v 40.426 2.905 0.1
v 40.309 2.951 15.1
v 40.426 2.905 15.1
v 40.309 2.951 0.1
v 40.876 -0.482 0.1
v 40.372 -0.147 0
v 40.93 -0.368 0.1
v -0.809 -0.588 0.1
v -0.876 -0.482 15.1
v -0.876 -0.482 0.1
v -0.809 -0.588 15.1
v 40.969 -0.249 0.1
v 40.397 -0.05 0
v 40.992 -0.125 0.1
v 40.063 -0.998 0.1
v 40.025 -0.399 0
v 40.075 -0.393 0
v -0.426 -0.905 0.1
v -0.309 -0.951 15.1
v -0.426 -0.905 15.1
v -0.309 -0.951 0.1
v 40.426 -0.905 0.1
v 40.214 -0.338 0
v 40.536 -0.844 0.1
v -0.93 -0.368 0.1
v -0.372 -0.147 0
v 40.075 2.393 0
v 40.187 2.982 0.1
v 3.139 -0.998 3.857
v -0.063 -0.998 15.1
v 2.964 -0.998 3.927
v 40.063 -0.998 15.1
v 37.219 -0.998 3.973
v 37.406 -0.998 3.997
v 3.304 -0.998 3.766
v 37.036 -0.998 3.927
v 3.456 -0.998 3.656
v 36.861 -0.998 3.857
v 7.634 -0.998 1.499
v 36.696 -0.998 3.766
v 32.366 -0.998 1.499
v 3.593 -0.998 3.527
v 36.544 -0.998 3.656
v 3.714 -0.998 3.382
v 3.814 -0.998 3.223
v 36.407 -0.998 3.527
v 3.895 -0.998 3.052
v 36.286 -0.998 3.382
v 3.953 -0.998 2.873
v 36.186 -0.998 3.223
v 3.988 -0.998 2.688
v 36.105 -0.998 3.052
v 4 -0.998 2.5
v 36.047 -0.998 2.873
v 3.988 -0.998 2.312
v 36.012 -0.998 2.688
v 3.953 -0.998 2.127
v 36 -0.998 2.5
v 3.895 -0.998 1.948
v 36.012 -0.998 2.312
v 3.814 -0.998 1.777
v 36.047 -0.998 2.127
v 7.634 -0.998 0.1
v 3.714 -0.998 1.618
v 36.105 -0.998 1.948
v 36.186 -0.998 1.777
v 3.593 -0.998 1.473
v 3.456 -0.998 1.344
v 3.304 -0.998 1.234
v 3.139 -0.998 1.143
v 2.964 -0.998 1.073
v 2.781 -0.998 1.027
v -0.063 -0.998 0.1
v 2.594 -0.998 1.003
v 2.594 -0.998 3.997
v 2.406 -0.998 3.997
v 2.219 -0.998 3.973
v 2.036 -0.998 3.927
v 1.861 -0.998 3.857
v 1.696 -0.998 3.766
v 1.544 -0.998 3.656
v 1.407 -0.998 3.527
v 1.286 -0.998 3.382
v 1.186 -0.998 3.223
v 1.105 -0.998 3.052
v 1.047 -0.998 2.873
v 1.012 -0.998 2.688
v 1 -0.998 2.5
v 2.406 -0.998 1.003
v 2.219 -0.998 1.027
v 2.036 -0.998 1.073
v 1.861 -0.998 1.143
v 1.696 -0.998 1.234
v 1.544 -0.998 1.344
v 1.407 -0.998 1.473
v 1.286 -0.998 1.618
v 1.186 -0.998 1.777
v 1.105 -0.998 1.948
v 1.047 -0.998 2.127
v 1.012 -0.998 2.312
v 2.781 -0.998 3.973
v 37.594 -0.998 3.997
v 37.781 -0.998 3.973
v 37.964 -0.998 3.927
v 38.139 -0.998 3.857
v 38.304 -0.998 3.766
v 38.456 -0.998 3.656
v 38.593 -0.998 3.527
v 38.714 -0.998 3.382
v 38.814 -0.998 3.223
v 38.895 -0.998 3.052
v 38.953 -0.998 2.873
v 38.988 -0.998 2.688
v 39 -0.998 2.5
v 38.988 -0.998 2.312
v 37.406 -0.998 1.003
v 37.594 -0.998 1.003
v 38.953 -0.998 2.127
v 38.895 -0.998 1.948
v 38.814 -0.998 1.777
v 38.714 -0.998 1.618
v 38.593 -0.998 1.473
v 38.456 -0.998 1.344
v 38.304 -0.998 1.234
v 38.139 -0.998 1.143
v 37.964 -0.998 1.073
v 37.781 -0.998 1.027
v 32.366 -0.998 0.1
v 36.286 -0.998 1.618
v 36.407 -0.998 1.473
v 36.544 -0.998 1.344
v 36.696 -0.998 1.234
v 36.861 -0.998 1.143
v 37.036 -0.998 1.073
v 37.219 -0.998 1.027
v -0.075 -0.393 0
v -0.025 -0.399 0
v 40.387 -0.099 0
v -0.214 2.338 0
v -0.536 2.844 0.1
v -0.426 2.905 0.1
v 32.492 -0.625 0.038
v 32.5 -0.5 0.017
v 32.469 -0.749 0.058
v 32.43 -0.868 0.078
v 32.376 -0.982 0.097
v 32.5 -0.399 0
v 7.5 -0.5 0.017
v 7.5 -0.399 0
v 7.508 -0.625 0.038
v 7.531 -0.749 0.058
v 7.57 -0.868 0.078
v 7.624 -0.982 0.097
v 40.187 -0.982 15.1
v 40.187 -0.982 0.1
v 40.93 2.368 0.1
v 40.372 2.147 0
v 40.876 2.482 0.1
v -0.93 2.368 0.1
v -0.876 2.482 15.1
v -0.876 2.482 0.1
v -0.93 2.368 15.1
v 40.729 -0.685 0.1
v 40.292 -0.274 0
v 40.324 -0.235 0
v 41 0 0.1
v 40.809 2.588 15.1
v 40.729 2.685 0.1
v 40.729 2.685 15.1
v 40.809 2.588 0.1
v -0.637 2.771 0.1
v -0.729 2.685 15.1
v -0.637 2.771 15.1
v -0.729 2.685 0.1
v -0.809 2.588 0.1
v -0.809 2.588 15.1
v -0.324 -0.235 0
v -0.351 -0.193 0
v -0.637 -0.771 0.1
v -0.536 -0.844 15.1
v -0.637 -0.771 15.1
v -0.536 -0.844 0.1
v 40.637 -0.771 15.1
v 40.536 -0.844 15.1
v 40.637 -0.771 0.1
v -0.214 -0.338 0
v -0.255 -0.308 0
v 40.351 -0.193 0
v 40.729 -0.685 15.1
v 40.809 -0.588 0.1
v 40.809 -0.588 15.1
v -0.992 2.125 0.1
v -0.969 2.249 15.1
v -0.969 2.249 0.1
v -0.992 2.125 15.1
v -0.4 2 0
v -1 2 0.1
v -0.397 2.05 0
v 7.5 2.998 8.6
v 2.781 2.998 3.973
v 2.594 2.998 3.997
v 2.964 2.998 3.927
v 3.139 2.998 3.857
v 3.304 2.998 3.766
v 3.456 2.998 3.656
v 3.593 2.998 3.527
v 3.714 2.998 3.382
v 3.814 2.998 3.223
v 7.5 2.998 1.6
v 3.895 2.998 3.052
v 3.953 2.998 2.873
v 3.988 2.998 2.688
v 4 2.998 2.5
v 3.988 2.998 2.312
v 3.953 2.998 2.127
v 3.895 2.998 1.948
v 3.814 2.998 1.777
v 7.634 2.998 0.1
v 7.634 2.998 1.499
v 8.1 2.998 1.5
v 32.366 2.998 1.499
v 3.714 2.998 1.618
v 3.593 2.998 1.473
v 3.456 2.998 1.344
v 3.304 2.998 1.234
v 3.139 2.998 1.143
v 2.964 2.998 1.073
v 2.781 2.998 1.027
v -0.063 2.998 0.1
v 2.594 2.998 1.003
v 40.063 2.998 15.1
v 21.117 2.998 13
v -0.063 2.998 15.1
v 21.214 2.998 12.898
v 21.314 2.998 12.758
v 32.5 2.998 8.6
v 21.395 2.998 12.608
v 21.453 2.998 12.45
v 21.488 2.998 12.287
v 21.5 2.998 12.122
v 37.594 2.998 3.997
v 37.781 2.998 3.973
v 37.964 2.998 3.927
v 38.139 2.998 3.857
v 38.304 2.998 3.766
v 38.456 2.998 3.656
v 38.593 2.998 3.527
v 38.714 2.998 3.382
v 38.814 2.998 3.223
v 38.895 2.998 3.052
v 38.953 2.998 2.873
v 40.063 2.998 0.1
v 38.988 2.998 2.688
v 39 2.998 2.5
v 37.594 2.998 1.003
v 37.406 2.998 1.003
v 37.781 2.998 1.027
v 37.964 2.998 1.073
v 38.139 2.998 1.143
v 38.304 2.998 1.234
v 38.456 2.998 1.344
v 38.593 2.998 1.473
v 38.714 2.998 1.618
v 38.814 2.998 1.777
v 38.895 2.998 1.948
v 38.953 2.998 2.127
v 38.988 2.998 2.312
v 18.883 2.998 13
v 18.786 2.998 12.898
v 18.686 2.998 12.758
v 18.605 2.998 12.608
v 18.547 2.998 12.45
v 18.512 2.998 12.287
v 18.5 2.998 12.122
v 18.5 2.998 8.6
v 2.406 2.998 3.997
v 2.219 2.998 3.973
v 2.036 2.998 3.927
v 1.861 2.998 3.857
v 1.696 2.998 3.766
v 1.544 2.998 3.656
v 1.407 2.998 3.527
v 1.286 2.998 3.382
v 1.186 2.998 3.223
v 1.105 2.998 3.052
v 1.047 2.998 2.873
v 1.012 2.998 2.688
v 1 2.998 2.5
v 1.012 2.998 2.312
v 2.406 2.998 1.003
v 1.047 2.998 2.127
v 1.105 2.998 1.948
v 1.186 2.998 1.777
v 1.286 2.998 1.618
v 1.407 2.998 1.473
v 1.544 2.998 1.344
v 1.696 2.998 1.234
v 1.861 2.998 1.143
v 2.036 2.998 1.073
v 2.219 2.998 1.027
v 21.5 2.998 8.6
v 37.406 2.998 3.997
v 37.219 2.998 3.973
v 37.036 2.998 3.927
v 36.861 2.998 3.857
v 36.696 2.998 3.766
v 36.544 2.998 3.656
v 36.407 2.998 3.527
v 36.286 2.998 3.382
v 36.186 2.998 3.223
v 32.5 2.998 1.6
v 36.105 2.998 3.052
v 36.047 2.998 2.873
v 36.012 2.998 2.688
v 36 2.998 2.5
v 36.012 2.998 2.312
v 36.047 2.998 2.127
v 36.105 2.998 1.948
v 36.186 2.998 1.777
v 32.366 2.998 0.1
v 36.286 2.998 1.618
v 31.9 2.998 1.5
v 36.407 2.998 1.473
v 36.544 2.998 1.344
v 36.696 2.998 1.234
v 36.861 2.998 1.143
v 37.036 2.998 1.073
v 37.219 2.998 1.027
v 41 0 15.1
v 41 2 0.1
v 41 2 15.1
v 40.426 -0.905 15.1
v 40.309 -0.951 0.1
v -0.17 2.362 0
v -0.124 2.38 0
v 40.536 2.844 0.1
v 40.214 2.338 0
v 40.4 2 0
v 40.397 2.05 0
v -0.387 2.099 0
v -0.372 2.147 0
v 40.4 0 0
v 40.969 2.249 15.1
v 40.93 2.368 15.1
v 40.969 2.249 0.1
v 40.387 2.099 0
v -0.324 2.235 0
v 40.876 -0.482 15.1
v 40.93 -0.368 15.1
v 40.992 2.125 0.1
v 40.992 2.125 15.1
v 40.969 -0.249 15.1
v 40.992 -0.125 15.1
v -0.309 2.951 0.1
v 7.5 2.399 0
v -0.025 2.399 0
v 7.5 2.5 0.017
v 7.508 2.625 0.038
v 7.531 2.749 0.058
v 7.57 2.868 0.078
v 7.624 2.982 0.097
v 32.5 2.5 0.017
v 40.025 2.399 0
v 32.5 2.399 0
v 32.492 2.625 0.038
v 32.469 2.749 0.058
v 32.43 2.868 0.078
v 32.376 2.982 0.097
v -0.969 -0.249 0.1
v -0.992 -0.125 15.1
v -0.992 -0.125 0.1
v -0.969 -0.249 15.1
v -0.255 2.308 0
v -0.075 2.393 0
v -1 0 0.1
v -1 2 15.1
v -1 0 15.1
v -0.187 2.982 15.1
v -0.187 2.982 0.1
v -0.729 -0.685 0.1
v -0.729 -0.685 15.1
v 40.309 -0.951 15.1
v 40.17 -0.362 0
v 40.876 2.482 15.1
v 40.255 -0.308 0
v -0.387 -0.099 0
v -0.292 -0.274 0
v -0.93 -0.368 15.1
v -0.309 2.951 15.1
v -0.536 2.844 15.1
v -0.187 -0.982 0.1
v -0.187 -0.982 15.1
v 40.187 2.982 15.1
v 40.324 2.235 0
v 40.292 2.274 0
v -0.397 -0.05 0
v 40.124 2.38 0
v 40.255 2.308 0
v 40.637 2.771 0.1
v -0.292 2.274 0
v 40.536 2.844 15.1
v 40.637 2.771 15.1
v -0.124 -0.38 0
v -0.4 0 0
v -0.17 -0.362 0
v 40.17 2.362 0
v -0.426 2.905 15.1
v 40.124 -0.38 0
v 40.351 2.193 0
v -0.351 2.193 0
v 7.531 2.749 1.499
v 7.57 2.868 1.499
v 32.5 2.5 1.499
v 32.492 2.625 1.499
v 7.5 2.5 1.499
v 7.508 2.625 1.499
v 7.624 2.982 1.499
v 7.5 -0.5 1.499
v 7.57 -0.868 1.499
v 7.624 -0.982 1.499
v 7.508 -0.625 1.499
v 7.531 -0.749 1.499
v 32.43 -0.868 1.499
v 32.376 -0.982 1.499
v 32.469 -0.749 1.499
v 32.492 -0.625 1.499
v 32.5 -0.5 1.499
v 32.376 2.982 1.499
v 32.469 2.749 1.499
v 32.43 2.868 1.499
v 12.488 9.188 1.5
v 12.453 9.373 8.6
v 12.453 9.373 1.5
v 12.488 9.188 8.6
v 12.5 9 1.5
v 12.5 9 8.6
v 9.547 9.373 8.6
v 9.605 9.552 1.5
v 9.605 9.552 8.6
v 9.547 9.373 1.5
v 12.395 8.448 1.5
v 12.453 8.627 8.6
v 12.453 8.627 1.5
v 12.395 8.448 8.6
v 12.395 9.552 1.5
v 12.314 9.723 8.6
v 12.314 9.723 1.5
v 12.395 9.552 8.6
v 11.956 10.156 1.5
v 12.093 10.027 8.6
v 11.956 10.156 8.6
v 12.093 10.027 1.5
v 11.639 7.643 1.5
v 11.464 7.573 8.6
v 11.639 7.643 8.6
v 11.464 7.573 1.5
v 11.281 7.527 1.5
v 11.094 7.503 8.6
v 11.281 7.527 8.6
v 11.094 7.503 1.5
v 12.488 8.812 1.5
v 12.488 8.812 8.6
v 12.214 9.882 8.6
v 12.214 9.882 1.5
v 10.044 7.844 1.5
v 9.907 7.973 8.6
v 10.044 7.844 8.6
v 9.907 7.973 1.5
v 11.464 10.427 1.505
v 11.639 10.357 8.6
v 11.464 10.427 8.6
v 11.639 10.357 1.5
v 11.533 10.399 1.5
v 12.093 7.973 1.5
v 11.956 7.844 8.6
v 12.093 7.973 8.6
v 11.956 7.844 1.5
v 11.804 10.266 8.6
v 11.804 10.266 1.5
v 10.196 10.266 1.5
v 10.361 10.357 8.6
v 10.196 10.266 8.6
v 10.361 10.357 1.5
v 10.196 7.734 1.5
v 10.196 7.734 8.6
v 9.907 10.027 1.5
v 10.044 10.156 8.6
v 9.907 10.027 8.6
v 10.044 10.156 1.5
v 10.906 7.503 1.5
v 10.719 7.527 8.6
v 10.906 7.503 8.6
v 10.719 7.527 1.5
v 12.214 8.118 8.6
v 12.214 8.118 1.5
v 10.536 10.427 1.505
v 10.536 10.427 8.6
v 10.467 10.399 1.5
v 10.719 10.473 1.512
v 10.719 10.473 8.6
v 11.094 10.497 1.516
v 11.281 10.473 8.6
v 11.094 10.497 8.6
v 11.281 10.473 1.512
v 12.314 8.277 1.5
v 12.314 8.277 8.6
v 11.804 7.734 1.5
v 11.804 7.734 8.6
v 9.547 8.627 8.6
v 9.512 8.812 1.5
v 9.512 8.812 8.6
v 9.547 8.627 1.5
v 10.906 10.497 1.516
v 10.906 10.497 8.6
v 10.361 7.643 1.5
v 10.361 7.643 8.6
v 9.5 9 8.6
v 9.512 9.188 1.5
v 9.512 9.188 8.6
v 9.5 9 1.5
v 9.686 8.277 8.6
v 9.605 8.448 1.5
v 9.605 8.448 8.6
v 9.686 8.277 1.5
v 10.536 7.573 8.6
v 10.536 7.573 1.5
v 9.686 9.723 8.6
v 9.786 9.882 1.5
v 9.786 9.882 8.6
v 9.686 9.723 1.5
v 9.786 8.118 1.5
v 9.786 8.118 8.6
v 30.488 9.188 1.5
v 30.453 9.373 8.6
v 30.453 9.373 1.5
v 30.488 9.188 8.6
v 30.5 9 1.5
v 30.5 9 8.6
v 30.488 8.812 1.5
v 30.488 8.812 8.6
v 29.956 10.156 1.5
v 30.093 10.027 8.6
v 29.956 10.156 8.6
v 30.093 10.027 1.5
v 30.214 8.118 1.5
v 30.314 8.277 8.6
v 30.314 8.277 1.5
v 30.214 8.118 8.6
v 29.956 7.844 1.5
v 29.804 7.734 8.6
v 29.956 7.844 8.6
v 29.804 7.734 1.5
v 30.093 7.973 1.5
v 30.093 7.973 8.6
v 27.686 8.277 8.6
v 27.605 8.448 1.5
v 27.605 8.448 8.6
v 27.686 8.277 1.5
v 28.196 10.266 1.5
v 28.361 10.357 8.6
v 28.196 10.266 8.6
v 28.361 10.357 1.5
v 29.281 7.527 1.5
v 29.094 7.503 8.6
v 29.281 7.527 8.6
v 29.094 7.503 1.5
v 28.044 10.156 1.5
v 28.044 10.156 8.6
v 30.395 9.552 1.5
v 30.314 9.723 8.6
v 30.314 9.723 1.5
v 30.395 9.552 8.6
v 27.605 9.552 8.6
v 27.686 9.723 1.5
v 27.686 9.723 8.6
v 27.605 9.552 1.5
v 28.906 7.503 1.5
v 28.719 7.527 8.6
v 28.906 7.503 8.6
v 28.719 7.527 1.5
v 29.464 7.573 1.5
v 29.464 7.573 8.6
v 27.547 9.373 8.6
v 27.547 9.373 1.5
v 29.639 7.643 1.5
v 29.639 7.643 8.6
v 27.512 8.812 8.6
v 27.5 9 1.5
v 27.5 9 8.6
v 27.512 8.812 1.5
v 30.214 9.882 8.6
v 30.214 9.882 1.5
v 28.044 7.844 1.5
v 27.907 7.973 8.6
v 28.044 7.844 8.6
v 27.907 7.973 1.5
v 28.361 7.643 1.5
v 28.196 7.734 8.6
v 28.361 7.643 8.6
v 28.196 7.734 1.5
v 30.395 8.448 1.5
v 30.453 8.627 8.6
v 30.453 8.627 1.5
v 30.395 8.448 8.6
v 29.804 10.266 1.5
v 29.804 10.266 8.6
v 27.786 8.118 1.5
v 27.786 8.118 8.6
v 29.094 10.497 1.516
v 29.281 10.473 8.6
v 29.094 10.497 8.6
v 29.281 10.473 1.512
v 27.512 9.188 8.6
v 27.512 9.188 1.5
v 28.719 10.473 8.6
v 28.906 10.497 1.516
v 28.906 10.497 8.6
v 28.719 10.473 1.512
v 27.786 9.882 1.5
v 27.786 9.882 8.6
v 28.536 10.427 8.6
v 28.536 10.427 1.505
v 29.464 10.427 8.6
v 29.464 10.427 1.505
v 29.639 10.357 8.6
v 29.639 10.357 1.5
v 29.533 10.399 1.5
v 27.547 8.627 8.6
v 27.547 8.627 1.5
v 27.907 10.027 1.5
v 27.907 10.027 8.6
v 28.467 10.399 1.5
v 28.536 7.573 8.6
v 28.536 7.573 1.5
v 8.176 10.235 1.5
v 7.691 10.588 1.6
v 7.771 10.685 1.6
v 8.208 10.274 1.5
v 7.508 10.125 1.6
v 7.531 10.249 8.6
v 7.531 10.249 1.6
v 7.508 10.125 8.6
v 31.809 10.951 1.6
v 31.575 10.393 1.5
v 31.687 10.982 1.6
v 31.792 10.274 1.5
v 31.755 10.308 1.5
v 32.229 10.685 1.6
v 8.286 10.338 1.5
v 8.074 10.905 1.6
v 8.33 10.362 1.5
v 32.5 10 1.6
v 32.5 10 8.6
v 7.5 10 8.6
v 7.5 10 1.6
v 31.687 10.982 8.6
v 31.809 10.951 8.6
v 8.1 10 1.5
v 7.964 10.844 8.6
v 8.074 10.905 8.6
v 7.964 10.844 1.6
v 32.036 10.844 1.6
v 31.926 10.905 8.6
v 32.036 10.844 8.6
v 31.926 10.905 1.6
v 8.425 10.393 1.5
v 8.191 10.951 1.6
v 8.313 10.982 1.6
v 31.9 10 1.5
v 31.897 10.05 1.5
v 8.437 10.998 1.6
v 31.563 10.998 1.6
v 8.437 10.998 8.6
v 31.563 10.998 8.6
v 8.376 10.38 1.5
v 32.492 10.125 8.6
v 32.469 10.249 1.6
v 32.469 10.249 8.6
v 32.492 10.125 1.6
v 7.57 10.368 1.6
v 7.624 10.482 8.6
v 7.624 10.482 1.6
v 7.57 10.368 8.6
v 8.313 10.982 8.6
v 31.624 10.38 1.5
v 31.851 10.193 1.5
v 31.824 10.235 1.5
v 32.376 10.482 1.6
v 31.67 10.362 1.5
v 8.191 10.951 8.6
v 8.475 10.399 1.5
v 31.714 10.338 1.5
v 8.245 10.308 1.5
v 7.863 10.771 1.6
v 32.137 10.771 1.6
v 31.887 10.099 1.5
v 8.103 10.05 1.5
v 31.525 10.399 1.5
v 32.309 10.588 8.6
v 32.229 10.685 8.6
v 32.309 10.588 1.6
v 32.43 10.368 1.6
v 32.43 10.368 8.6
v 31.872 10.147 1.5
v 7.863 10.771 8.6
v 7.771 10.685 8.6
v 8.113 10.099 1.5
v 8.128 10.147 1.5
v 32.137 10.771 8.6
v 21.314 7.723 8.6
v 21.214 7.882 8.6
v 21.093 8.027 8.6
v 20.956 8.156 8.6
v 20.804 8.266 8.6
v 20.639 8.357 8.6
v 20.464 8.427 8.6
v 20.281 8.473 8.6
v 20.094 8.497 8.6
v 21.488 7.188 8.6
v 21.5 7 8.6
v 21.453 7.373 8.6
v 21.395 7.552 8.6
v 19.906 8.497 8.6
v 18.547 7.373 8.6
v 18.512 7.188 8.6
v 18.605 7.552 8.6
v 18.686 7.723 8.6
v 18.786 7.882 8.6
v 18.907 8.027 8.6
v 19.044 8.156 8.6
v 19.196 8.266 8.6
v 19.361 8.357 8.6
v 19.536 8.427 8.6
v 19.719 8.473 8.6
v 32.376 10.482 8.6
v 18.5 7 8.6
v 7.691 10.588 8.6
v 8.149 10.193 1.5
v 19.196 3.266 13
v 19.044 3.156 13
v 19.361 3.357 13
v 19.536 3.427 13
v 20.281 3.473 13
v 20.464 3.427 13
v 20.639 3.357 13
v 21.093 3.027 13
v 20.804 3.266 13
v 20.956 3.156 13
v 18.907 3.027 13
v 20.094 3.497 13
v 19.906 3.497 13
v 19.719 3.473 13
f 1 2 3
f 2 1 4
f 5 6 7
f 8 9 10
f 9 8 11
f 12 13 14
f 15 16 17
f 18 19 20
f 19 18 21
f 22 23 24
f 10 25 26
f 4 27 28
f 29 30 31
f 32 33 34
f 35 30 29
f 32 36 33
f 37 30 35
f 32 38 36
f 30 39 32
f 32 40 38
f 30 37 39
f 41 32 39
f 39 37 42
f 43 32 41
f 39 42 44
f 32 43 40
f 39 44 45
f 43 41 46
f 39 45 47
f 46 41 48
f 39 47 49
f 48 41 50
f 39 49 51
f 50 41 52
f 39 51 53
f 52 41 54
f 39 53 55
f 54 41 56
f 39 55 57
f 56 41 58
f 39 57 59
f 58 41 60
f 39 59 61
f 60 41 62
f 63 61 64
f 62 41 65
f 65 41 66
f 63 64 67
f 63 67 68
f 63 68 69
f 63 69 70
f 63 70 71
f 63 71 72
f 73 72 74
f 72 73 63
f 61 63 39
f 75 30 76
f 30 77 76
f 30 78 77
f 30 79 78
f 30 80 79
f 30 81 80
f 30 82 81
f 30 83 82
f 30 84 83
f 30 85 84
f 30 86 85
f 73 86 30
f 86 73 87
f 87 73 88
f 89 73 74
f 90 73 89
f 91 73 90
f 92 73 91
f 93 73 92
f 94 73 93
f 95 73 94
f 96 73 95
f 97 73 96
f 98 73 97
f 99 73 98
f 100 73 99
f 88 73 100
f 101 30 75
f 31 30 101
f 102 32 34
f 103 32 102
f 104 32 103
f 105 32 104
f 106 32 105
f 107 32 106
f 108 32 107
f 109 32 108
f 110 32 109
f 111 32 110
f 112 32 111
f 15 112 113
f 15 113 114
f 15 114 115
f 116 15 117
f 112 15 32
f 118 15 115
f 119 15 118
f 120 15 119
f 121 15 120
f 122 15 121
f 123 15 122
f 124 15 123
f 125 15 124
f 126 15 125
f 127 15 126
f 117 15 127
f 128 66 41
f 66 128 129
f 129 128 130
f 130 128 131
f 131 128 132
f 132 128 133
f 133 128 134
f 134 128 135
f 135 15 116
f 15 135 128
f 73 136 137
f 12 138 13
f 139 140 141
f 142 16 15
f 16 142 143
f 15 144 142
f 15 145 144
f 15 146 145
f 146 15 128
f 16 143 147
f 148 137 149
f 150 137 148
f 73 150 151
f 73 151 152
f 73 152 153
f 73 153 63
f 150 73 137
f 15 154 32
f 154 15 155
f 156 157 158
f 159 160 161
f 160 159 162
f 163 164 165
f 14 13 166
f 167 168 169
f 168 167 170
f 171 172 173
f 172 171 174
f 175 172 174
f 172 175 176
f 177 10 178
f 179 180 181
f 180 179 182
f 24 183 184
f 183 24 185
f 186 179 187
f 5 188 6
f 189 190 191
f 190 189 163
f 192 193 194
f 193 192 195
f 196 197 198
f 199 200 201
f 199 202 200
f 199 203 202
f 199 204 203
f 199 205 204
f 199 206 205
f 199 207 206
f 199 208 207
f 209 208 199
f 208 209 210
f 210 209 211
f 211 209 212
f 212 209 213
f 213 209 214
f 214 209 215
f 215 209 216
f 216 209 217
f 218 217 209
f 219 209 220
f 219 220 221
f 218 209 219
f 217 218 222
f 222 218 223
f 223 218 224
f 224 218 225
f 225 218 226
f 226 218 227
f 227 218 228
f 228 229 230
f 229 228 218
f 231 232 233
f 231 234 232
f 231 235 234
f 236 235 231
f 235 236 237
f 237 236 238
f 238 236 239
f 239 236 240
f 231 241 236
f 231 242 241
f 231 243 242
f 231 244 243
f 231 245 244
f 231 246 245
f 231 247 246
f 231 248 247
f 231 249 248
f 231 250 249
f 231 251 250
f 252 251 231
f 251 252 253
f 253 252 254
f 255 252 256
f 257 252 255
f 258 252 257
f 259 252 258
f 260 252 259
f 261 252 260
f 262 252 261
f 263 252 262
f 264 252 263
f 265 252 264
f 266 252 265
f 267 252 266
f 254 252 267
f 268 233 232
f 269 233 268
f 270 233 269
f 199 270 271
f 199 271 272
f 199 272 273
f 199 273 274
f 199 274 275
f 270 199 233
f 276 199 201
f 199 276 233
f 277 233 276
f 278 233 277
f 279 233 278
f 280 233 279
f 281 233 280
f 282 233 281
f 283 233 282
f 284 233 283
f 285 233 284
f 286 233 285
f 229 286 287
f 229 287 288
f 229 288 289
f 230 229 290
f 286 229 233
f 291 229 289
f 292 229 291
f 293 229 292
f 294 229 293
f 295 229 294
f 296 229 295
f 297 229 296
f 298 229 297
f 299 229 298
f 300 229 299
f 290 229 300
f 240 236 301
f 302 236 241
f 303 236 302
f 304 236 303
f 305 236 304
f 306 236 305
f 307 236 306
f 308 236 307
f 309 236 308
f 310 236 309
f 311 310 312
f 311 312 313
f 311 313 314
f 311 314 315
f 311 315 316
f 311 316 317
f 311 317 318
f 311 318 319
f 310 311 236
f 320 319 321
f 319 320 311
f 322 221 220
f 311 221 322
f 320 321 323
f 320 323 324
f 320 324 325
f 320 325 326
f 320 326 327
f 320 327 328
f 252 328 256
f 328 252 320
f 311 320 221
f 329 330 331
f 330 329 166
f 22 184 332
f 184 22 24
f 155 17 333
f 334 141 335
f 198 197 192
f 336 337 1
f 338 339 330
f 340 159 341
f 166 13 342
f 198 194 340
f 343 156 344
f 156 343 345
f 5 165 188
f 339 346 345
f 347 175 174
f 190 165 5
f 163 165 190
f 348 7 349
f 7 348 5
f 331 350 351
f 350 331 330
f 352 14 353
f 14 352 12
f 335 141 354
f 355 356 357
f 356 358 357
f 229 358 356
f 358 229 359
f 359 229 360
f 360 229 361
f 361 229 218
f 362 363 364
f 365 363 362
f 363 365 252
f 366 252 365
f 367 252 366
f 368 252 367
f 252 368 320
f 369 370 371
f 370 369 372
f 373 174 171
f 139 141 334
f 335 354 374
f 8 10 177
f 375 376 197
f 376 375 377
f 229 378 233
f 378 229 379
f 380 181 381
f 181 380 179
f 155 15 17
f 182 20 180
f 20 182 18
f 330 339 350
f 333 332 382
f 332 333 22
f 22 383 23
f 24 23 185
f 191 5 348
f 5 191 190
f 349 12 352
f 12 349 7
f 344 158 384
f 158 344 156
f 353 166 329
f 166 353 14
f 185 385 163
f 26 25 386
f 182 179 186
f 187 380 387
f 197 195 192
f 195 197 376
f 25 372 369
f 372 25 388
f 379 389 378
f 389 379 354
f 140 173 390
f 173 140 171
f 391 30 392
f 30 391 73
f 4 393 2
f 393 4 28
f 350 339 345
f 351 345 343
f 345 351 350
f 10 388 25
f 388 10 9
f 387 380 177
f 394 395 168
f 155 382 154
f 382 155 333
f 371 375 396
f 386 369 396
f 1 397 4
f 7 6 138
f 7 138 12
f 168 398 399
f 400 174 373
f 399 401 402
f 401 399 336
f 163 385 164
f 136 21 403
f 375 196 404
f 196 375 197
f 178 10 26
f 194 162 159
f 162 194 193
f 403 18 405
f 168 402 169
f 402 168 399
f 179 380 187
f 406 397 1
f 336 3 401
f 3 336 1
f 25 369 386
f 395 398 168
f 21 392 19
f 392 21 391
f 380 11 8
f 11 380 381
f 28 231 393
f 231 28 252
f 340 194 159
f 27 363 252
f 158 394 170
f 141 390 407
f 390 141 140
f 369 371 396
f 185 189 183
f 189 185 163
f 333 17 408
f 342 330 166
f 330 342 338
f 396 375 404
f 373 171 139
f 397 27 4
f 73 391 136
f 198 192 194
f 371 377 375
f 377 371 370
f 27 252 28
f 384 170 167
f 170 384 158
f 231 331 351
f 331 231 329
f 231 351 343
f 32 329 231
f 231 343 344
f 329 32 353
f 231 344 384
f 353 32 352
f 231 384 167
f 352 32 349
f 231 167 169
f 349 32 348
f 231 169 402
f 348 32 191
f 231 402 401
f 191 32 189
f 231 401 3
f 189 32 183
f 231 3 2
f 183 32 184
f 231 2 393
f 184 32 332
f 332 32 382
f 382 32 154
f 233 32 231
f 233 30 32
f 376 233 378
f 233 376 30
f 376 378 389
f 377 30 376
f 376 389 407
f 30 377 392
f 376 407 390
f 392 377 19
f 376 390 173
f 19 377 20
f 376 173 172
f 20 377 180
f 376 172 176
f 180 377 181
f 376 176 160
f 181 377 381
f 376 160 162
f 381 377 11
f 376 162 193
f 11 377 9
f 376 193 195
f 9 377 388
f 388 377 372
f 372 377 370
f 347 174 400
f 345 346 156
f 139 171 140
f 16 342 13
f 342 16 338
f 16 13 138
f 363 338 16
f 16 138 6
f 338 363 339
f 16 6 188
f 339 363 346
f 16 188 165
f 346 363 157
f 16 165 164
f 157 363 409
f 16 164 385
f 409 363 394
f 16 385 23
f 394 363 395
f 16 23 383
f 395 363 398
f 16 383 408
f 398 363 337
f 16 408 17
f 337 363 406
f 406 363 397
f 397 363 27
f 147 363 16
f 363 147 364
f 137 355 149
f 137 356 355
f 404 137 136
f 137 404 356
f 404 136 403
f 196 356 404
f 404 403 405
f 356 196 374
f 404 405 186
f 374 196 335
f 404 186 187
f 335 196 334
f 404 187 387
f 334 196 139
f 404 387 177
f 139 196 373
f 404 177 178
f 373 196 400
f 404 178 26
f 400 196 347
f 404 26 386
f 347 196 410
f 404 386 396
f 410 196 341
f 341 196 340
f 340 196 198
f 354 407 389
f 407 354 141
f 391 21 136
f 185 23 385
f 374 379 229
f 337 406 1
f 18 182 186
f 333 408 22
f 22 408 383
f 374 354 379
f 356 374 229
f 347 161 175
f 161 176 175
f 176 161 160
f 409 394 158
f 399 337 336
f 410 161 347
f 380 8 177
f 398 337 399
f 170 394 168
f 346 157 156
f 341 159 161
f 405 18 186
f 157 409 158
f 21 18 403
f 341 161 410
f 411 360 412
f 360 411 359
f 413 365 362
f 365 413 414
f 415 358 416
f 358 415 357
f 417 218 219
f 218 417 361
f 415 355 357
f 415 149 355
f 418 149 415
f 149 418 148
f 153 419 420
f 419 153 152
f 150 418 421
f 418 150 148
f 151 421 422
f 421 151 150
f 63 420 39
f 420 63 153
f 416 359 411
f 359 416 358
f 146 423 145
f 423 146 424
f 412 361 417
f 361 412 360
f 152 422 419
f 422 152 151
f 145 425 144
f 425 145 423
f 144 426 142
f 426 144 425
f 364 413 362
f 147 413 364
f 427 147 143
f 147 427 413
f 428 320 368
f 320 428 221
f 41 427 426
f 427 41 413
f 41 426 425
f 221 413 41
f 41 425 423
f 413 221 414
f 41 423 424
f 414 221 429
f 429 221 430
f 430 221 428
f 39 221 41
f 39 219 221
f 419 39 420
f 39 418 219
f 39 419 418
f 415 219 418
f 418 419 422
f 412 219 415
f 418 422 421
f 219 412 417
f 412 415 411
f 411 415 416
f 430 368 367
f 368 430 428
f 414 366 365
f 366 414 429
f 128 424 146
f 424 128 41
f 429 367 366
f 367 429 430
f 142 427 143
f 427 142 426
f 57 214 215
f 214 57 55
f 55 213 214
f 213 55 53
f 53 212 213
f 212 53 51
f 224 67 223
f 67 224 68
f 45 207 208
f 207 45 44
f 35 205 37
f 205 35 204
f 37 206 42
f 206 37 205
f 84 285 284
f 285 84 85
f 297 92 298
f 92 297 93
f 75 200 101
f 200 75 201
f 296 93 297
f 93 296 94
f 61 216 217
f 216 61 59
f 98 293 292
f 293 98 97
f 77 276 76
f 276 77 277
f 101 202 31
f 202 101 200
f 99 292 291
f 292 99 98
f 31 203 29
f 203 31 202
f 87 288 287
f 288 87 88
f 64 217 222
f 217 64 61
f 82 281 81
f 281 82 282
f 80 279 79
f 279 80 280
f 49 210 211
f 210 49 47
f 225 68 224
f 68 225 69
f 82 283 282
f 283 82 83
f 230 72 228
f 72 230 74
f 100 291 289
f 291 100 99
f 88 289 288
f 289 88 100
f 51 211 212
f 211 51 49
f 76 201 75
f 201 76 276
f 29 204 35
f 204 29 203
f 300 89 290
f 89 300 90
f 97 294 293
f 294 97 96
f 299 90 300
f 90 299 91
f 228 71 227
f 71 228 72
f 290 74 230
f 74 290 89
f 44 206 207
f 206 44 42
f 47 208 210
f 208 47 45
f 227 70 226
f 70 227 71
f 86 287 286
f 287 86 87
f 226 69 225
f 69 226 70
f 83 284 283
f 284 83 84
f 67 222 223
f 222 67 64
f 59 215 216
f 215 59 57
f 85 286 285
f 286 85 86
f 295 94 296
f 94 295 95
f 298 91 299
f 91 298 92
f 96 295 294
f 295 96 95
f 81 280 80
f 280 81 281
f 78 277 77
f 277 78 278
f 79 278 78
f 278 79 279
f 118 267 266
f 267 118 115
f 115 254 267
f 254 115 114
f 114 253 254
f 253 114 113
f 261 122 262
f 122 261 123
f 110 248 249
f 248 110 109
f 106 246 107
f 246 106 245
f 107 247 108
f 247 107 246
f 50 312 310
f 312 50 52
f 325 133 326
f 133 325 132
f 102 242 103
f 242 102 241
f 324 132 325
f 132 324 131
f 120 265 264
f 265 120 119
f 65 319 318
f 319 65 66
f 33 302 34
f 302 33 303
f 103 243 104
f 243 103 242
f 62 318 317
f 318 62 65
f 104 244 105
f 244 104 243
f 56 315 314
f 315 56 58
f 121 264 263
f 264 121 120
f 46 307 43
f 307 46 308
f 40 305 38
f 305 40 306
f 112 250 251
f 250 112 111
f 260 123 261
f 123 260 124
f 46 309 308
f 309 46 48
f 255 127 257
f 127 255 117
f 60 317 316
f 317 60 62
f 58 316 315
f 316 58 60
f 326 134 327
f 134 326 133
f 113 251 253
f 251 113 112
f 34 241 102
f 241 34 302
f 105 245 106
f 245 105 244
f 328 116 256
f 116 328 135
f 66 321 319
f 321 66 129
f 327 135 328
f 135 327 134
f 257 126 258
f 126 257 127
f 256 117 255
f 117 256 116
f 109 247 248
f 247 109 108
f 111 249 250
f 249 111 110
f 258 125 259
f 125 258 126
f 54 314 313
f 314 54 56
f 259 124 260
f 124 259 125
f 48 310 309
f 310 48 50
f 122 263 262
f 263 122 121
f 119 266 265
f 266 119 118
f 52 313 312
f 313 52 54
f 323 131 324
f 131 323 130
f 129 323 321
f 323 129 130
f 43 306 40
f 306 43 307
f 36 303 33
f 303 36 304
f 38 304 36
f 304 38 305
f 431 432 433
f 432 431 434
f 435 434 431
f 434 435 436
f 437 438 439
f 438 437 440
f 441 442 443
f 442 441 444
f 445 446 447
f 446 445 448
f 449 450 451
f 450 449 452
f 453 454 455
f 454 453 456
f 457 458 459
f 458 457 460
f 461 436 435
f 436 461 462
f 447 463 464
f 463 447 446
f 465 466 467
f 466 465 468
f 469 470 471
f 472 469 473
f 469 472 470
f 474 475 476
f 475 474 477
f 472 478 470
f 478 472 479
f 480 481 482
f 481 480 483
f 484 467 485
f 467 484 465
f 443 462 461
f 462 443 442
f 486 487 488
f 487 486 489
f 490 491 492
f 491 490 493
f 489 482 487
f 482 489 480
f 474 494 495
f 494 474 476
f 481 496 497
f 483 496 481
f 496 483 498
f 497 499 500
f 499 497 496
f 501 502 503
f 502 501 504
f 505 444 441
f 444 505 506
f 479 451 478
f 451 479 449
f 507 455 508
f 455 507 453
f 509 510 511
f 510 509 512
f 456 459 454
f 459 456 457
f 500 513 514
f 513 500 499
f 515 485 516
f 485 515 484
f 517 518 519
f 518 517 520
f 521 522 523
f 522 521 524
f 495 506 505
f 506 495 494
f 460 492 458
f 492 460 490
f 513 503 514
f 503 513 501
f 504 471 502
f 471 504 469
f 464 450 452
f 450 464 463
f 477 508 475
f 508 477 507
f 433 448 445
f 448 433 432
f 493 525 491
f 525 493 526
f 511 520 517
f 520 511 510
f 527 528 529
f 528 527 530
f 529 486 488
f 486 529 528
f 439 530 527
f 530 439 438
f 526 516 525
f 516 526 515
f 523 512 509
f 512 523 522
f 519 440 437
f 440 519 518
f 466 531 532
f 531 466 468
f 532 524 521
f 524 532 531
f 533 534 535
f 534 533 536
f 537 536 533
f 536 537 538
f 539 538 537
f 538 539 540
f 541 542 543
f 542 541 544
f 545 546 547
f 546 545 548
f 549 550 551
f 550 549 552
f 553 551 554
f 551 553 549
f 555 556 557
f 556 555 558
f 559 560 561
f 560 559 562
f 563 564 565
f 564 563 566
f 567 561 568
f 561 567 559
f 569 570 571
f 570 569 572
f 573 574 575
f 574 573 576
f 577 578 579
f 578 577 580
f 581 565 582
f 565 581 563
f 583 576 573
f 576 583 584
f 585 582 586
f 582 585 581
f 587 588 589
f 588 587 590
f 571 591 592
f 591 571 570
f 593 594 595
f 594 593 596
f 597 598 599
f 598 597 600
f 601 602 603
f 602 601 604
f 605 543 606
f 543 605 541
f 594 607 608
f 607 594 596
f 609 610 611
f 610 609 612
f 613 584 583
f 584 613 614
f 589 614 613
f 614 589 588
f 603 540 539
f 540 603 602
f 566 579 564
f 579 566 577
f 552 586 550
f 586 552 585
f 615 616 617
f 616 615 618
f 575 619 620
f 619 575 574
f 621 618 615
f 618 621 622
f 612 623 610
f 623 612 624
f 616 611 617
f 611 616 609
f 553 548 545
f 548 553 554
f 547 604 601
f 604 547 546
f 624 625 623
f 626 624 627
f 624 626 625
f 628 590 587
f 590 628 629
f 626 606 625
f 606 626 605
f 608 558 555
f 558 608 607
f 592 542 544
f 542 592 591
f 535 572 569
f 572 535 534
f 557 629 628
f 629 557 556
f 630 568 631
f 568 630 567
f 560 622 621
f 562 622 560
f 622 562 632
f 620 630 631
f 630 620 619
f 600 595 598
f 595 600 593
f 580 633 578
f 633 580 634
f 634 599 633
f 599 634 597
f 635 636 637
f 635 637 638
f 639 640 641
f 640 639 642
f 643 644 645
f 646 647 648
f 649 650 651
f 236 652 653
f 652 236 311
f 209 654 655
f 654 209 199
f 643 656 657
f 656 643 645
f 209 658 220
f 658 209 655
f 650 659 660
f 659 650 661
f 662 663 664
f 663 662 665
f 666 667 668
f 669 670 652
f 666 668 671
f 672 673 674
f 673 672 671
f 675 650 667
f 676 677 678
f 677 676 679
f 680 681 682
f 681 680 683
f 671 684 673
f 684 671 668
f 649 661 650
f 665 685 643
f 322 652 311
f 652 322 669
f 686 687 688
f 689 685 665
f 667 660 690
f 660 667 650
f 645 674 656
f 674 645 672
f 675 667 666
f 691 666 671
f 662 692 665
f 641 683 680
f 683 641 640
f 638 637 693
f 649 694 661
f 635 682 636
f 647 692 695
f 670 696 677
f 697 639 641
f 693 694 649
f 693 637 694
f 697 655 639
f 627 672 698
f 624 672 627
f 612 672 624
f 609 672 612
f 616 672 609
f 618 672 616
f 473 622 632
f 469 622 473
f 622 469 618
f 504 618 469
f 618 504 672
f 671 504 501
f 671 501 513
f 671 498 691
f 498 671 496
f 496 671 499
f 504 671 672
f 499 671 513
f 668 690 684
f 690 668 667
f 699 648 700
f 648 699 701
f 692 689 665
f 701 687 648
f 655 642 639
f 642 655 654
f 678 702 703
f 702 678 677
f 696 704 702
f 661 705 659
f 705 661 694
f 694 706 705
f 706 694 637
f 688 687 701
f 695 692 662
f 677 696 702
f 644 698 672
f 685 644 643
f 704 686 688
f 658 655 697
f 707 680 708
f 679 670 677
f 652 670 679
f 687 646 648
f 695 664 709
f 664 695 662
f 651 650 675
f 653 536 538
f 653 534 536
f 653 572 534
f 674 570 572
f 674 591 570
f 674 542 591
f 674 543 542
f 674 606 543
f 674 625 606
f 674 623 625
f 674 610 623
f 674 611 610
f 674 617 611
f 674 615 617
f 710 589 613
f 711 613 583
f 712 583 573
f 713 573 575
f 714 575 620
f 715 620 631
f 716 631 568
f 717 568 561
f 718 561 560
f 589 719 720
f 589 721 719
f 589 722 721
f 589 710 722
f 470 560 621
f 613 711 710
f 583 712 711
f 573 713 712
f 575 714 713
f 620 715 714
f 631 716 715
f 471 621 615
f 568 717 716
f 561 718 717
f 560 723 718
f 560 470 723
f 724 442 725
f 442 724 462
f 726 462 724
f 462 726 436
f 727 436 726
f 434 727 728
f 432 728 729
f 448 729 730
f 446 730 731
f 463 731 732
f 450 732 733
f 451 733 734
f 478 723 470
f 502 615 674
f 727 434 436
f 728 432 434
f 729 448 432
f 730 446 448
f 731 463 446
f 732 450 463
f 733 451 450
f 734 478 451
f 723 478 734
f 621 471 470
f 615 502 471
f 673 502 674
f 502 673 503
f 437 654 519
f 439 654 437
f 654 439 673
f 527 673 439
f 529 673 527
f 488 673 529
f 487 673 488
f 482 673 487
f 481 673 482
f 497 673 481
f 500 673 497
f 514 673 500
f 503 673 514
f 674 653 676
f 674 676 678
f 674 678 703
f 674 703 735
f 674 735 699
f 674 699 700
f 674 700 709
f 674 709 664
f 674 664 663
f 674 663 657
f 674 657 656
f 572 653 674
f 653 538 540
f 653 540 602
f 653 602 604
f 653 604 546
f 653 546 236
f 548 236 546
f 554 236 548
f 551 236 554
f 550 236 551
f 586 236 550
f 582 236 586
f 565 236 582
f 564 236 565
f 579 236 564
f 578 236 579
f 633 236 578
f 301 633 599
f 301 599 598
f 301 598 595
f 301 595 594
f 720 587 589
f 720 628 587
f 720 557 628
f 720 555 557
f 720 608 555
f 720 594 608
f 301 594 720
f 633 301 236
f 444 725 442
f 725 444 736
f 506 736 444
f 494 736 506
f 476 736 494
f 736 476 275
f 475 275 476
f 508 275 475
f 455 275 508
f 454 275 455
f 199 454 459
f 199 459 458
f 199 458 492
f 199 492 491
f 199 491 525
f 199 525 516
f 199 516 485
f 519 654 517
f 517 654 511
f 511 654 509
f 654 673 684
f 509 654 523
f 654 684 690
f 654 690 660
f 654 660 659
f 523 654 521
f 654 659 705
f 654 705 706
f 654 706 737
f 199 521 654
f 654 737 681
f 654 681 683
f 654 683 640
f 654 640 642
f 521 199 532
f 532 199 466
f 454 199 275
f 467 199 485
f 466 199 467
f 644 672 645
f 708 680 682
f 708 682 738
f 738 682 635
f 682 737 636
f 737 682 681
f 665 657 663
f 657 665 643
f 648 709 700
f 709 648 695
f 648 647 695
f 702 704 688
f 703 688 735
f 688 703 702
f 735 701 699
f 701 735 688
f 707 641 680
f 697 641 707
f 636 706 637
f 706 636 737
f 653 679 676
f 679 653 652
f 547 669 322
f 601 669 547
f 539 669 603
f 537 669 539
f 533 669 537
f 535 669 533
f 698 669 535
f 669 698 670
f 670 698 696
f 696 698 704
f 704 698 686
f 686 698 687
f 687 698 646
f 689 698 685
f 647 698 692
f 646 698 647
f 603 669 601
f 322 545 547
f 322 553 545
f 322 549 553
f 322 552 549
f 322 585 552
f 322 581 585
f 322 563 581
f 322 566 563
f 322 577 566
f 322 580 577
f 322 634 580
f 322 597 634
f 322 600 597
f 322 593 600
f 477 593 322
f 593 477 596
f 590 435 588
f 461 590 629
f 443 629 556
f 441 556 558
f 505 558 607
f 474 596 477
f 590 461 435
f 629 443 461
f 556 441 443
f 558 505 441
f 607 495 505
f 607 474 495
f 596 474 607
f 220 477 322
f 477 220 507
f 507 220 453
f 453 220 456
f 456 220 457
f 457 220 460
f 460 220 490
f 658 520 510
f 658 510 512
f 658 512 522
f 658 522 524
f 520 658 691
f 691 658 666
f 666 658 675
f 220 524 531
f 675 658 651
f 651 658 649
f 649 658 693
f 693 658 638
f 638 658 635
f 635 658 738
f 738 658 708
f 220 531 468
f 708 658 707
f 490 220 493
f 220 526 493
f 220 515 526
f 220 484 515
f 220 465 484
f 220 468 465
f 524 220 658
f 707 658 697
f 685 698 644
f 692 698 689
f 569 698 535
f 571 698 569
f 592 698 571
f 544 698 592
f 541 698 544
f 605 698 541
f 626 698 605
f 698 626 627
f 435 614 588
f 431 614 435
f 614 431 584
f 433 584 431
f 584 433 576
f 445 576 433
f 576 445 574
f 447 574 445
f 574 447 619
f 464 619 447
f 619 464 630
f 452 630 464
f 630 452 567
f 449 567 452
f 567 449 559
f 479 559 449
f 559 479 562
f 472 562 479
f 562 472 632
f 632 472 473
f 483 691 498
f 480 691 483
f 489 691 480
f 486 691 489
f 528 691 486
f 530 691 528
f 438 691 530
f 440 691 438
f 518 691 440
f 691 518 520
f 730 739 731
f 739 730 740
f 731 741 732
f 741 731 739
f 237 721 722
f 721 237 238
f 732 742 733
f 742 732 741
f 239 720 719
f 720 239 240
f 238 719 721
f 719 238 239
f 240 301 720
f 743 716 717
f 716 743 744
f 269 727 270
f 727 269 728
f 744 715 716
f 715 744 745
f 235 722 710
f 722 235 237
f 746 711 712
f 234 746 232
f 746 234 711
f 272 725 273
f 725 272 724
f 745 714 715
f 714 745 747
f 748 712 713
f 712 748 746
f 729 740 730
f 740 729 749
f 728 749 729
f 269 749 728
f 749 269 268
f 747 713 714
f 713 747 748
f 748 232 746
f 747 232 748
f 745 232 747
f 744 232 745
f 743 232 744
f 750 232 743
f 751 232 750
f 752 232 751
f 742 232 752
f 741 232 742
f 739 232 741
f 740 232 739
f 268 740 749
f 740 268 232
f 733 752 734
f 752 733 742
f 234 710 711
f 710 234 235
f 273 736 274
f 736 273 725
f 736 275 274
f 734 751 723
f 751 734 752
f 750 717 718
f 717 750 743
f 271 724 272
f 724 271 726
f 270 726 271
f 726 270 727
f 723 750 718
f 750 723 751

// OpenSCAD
// file: util.scad
module rounded_cube(c=[1,1,1], r=0.1, h=0.4) {
    minkowski(){
      cube(c);
      cylinder(r,h);
    }
}

module half_cylinder(h=1, r=1) {
 intersection() {
     translate([0, -r, 0]) cube([r*2,r*2,h]);
     cylinder(r=r, h=h);
 }   
}

module halfSphere(r=1) {
 intersection() {
     translate([0, -r, -r]) cube([r*2,r*2,r*2]);
     sphere(r=r);
 }   
}

module pin(h=1) {
    hull(){
        cylinder(h=0.1,r=h/2);
        translate([0,0,h]) sphere(r=0.1);
    }
}

module hollow_cylinder(h=1, r=1, shell=0.1) {
    s = 1 - shell;
    difference() {
        cylinder(h=h,r=r);
        translate([0,0,-0.5]) cylinder(h=h+1,r=r*s);
    }
}

module cube_minus_sphere(size=1) {
    difference() {
       translate([-size/2,0.1,-size/2]) cube([size,size/2,size]);
       rotate([0,0,90]) halfSphere(r=size/2);
    }
}

module curve_cube(c=[1,1,1], curve=0.5) {
    difference() {
        rounded_cube(c);
        scale([1, 1, curve]) 
            translate([-1.5,c[1]/2,-c[1]/8]) 
                rotate([0,90,0]) 
                    cylinder(h=c[0]+3,r=c[1]/1.8);
    }    
}
module hook(h=5, d=3) {
    $fn=100;
    cylinder(h,d=d);
    translate([0,0,h]) sphere(d=d);
    
}

module cone(startDia=5, endDia=1, h=5) {
    $fn=200;
    hull() {
        cylinder(h=0.1, d=startDia);
        translate([0,0,endDia]) cylinder(h, d=endDia);
    }
}


module flexScrewHole(screwLength=10, screwDia=5, stretch=10, center=true ) {
    centerX = center ? -stretch/2 : 0;
    translate([centerX,0,0]){
        hull() {
            cylinder(h=screwLength, d=screwDia);
            translate([stretch,0,0]) cylinder(h=screwLength, d=screwDia);
        }
    }
}

module nut() {
    $fn=6;
    cylinder(d=TC_SCREW_NUT_DIA, h=TC_SCREW_NUT_HEIGHT);   
}

module hollow_rounded_cube(c=[1,1,1], shell=2.5, center=true) {
    //center
    centerX = center ? -c[0]/2 : 0;
    centerY = center ? -c[1]/2 : 0;
    translate([centerX,centerY, 0]) {
    
    difference() { 
        rounded_cube(c,0.1, 0.4);
        //inner
        translate([shell/2,shell/2,-.1]) {
            rounded_cube([c[0]-shell,c[1]-shell,c[2]+1],0.1, 0.4);
        }
    }
}
}

module triangle(size=100, height=10) {
 linear_extrude(height=height) polygon(points=[[0,0],[size,0],[0,size]], paths=[[0,1,2]]);
}
// file: startup.scad
include <util.scad>;

$fn =50;

//Aluminuim profile 3030
ALUMINUM_SIZE=30;

// carraige mount
CARRAGE_MOUNT_X=35;
CARRAGE_MOUNT_Y=65;
CARRAGE_MOUNT_Z=7;
TOOL_CHANGER_Z=7;

//size
CMS =
[CARRAGE_MOUNT_X,
CARRAGE_MOUNT_Y,
CARRAGE_MOUNT_Z];

// tool changer
toolChangerSize = 
[CARRAGE_MOUNT_X,
CARRAGE_MOUNT_Y,
TOOL_CHANGER_Z];

// tool catcher
TC_BASE_X=ALUMINUM_SIZE;
TC_BASE_Y=5;
TC_BASE_Z=20;
TC_BASE=[TC_BASE_X,TC_BASE_Y,TC_BASE_Z];


//locking in location small rods
RODS_HEIGHT=9;   // real heigt is 12
RODS_DIA=3.5;
RODS_FROM_X_FRONT=6;
RODS_FROM_Y_FRONT=20;
RODS_DISTANCE_FRONT=24;

// HOOKS
HOOKS_HEIGT=6;
HOOKS_DIA=6;

//magnets
MAGNET_DIA=12.5;
MAGNET_HEIGHT=5.5;
MAGNET_DISTANCE=30;

//new magnets
MAGNET_NEW_DIA=20;
MAGNET_NEW_HEIGHT=6;

//Brass Knurl screw
BRASS_KNURL_SCREW_DIA=5;
BRASS_KNURL_SCREW_HEIGHT=5;

//V6 HOT END
v6_DIA=16;
v6_DIA_HEIGHT_DOWN=3;
v6_DIA_HEIGHT_UP=3.7;
v6_INNER_DIA=12;
v6_INNER_HEIGHT=6;

v6_MOUNT_HEIGHT=v6_DIA_HEIGHT_DOWN + v6_INNER_HEIGHT + v6_DIA_HEIGHT_UP - .2;
v6_MOUNT_WIDTH=20;

v6_SECOND_PART_WIDTH=11;

//tool change
TC_SCREW_DISTANCE = 55;
TC_SCREW_LENGTH = 25;
TC_SCREW_HEAD_HEIGHT = 5;
TC_SCREW_HEAD_DIA = 10;
TC_SCREW_DIA = 4;

//nut 
TC_SCREW_NUT_DIA = 8;
TC_SCREW_NUT_HEIGHT = 4;


//tool catcher
TOOL_CATHCER_SCREWS_DISTANCE = ALUMINUM_SIZE/2;

//plastic tie 
PLASTIC_TIE_HEIGHT = 2.2;
PLASTIC_TIE_DEPTH = 3;

//fan mount
FAN_MOUNT_DISTANCE=20;
FAN_MOUNT_TUBE_DIA=5;


module toolChangeScrew() {
//top
cylinder (h=TC_SCREW_HEAD_HEIGHT, d=TC_SCREW_HEAD_DIA);
//body
translate([0,0,TC_SCREW_HEAD_HEIGHT -.1])
cylinder (h=TC_SCREW_LENGTH, d=TC_SCREW_DIA);    
}

module toolChangeScrews(right=true, center=true) {
    r = right ? 180 : 0;
    c = center ? -TC_SCREW_DISTANCE/2 : 0;
    translate([c,0,0]) {
        rotate([r,0,0]) {
            toolChangeScrew();
            translate([TC_SCREW_DISTANCE,0,0])
                toolChangeScrew();
        }
  }
}

module toolChangeScrewsWithNut(right=true, center=true) {
    toolChangeScrews(right, center);
    c = center ? -TC_SCREW_DISTANCE/2 : 0;
    r = right ? -TC_SCREW_LENGTH : TC_SCREW_LENGTH;
    translate([c,0,0]) {
      translate([0,0, r]) nut();
      translate([TC_SCREW_DISTANCE,0,r]) nut();
    }
    
    
}

module M3Screw(length=10) {
    //top
    cylinder (h=3, d=5.5);
    //body
    translate([0,0,3 -.1])
    cylinder (h=length, d=3);
}

module M5Screw(length=10) {
    //top
    cylinder (h=5, d=9);
    //body
    translate([0,0,5 -.1])
    cylinder (h=length, d=5);
}

module brassKnurlScrew() {
    cylinder (h=BRASS_KNURL_SCREW_HEIGHT, d=BRASS_KNURL_SCREW_DIA);
}


module magnet(h=MAGNET_HEIGHT, d=MAGNET_DIA) {
    cylinder (h=MAGNET_HEIGHT, d=MAGNET_DIA);
}

module small_rods_relative(distanceBetweenRodsX=10, distanceBetweenRodsY=10 ,centerRode=true) {
    //up right
    cylinder(h=RODS_HEIGHT, d=RODS_DIA);
    //up left
    translate([distanceBetweenRodsX,0,0])
      cylinder(h=RODS_HEIGHT, d=RODS_DIA);
    //down right
    translate([0,distanceBetweenRodsY,0])
      cylinder(h=RODS_HEIGHT, d=RODS_DIA);
    //down left
    translate([distanceBetweenRodsX,distanceBetweenRodsY,0])
      cylinder(h=RODS_HEIGHT, d=RODS_DIA);
    if(centerRode){
    //center
    translate([distanceBetweenRodsX/2,distanceBetweenRodsY/2,0])
      cylinder(h=RODS_HEIGHT, d=RODS_DIA);
    }
}

module small_hooks_relative(distanceBetweenHooksX=10, distanceBetweenHooksY=10, hooksScale=1) {
    //up right
    scale(hooksScale) hook(h=HOOKS_HEIGT, d=HOOKS_DIA);
    //up left
    translate([distanceBetweenHooksX,0,0])
      scale(hooksScale) hook(h=HOOKS_HEIGT, d=HOOKS_DIA);
    //down right
    translate([0,distanceBetweenHooksY,0])
      scale(hooksScale) hook(h=HOOKS_HEIGT, d=HOOKS_DIA);
    //down left
    translate([distanceBetweenHooksX,distanceBetweenHooksY,0])
      scale(hooksScale) hook(h=HOOKS_HEIGT, d=HOOKS_DIA);
}

module magnetsRelative(distanceBetweenMagnet=15, center=true) {
    
    c = center ? 0 : -distanceBetweenMagnet/2 ;
    translate([c, 0,0 ]){
    
      //up center
      translate ([distanceBetweenMagnet/2, 0,0]) magnet();    
      //translate ([distanceBetweenMagnetX, distanceBetweenMagnetY,0])
       // magnet();
      translate ([-distanceBetweenMagnet/2, 0,0])
        magnet();
    }
}


module tieHole(tieSize=3, depth=10) {
   rotate_extrude(angle=180, $fn=100)
       translate([depth, 0]) circle(tieSize);   
}

module M3nut() {
    $fn=6;
    cylinder(d=6, h=3);
}

module newMagnet() {
    $fn=400;
    cylinder(h=MAGNET_NEW_HEIGHT, d=MAGNET_NEW_DIA);
}

module toolChangerScrewGate() {
    cone(TC_SCREW_DIA+1.5, TC_SCREW_DIA, 2);
}
// main file
include <startup.scad>;
include <util.scad>;

TOUCH_MOUNT_X=23;
TOUCH_MOUNT_Y=8;
TOUCH_MOUNT_Z=7;

WALL_HEIGHT=15;
WALL_WEIGHT=40;
WALL_LENGTH=2;

TOUCH_OFFSET=1.5;

CARRAGE_SCREW_DIA=3;

TOUCH_SCREW_DIA=3;

TOUCH_SCREW_DISTANCE=18;

GRIP_SIZE=5;

module grip() {
    hull() {
        cylinder(d=3, h=WALL_HEIGHT - TOUCH_MOUNT_Z -  TOUCH_OFFSET - 2);
        translate([0,GRIP_SIZE,0]) cylinder(d=3, h=.1);
    }
}

module  touchScrews() {
translate([-TOUCH_SCREW_DISTANCE/2,0,0]) 
    cylinder(d=TOUCH_SCREW_DIA,h=TOUCH_MOUNT_Z+1);
translate([TOUCH_SCREW_DISTANCE/2,0,0])
    cylinder(d=TOUCH_SCREW_DIA,h=TOUCH_MOUNT_Z+1);    
}

module touchMount() {
    difference() {
        rounded_cube([TOUCH_MOUNT_X, TOUCH_MOUNT_Y,TOUCH_MOUNT_Z], 0.1, 0.4);
        translate([TOUCH_MOUNT_X/2,TOUCH_MOUNT_Y/2 + TOUCH_SCREW_DIA,-.5]) 
            touchScrews();
    }
}

module wall() {
    difference() {
        rounded_cube([WALL_WEIGHT, WALL_LENGTH, WALL_HEIGHT],0.1, 0.4);
        translate([(WALL_WEIGHT/2) - (TOUCH_MOUNT_X/2) ,-.5,-.5]) 
            rounded_cube([TOUCH_MOUNT_X, WALL_LENGTH+1, TOUCH_OFFSET+.399],0.1, 0.4);
            translate([CARRAGE_SCREW_DIA/2+1,-1,CARRAGE_SCREW_DIA/2+1]) 
        rotate([-90,0,0]) cylinder(d=CARRAGE_SCREW_DIA, h=WALL_LENGTH+2);
            translate([WALL_WEIGHT - CARRAGE_SCREW_DIA/2-1,-1,CARRAGE_SCREW_DIA/2+1]) rotate([-90,0,0]) cylinder(d=CARRAGE_SCREW_DIA, h=WALL_LENGTH+2);
    }
}

module base() {
    wall();
    translate([0,0,TOUCH_OFFSET]){
    translate([(WALL_WEIGHT/2) - (TOUCH_MOUNT_X/2) ,WALL_LENGTH,0]) 
        touchMount();
    translate([(WALL_WEIGHT/2)  ,WALL_LENGTH, TOUCH_MOUNT_Z])
        grip();
    }
}

base();
